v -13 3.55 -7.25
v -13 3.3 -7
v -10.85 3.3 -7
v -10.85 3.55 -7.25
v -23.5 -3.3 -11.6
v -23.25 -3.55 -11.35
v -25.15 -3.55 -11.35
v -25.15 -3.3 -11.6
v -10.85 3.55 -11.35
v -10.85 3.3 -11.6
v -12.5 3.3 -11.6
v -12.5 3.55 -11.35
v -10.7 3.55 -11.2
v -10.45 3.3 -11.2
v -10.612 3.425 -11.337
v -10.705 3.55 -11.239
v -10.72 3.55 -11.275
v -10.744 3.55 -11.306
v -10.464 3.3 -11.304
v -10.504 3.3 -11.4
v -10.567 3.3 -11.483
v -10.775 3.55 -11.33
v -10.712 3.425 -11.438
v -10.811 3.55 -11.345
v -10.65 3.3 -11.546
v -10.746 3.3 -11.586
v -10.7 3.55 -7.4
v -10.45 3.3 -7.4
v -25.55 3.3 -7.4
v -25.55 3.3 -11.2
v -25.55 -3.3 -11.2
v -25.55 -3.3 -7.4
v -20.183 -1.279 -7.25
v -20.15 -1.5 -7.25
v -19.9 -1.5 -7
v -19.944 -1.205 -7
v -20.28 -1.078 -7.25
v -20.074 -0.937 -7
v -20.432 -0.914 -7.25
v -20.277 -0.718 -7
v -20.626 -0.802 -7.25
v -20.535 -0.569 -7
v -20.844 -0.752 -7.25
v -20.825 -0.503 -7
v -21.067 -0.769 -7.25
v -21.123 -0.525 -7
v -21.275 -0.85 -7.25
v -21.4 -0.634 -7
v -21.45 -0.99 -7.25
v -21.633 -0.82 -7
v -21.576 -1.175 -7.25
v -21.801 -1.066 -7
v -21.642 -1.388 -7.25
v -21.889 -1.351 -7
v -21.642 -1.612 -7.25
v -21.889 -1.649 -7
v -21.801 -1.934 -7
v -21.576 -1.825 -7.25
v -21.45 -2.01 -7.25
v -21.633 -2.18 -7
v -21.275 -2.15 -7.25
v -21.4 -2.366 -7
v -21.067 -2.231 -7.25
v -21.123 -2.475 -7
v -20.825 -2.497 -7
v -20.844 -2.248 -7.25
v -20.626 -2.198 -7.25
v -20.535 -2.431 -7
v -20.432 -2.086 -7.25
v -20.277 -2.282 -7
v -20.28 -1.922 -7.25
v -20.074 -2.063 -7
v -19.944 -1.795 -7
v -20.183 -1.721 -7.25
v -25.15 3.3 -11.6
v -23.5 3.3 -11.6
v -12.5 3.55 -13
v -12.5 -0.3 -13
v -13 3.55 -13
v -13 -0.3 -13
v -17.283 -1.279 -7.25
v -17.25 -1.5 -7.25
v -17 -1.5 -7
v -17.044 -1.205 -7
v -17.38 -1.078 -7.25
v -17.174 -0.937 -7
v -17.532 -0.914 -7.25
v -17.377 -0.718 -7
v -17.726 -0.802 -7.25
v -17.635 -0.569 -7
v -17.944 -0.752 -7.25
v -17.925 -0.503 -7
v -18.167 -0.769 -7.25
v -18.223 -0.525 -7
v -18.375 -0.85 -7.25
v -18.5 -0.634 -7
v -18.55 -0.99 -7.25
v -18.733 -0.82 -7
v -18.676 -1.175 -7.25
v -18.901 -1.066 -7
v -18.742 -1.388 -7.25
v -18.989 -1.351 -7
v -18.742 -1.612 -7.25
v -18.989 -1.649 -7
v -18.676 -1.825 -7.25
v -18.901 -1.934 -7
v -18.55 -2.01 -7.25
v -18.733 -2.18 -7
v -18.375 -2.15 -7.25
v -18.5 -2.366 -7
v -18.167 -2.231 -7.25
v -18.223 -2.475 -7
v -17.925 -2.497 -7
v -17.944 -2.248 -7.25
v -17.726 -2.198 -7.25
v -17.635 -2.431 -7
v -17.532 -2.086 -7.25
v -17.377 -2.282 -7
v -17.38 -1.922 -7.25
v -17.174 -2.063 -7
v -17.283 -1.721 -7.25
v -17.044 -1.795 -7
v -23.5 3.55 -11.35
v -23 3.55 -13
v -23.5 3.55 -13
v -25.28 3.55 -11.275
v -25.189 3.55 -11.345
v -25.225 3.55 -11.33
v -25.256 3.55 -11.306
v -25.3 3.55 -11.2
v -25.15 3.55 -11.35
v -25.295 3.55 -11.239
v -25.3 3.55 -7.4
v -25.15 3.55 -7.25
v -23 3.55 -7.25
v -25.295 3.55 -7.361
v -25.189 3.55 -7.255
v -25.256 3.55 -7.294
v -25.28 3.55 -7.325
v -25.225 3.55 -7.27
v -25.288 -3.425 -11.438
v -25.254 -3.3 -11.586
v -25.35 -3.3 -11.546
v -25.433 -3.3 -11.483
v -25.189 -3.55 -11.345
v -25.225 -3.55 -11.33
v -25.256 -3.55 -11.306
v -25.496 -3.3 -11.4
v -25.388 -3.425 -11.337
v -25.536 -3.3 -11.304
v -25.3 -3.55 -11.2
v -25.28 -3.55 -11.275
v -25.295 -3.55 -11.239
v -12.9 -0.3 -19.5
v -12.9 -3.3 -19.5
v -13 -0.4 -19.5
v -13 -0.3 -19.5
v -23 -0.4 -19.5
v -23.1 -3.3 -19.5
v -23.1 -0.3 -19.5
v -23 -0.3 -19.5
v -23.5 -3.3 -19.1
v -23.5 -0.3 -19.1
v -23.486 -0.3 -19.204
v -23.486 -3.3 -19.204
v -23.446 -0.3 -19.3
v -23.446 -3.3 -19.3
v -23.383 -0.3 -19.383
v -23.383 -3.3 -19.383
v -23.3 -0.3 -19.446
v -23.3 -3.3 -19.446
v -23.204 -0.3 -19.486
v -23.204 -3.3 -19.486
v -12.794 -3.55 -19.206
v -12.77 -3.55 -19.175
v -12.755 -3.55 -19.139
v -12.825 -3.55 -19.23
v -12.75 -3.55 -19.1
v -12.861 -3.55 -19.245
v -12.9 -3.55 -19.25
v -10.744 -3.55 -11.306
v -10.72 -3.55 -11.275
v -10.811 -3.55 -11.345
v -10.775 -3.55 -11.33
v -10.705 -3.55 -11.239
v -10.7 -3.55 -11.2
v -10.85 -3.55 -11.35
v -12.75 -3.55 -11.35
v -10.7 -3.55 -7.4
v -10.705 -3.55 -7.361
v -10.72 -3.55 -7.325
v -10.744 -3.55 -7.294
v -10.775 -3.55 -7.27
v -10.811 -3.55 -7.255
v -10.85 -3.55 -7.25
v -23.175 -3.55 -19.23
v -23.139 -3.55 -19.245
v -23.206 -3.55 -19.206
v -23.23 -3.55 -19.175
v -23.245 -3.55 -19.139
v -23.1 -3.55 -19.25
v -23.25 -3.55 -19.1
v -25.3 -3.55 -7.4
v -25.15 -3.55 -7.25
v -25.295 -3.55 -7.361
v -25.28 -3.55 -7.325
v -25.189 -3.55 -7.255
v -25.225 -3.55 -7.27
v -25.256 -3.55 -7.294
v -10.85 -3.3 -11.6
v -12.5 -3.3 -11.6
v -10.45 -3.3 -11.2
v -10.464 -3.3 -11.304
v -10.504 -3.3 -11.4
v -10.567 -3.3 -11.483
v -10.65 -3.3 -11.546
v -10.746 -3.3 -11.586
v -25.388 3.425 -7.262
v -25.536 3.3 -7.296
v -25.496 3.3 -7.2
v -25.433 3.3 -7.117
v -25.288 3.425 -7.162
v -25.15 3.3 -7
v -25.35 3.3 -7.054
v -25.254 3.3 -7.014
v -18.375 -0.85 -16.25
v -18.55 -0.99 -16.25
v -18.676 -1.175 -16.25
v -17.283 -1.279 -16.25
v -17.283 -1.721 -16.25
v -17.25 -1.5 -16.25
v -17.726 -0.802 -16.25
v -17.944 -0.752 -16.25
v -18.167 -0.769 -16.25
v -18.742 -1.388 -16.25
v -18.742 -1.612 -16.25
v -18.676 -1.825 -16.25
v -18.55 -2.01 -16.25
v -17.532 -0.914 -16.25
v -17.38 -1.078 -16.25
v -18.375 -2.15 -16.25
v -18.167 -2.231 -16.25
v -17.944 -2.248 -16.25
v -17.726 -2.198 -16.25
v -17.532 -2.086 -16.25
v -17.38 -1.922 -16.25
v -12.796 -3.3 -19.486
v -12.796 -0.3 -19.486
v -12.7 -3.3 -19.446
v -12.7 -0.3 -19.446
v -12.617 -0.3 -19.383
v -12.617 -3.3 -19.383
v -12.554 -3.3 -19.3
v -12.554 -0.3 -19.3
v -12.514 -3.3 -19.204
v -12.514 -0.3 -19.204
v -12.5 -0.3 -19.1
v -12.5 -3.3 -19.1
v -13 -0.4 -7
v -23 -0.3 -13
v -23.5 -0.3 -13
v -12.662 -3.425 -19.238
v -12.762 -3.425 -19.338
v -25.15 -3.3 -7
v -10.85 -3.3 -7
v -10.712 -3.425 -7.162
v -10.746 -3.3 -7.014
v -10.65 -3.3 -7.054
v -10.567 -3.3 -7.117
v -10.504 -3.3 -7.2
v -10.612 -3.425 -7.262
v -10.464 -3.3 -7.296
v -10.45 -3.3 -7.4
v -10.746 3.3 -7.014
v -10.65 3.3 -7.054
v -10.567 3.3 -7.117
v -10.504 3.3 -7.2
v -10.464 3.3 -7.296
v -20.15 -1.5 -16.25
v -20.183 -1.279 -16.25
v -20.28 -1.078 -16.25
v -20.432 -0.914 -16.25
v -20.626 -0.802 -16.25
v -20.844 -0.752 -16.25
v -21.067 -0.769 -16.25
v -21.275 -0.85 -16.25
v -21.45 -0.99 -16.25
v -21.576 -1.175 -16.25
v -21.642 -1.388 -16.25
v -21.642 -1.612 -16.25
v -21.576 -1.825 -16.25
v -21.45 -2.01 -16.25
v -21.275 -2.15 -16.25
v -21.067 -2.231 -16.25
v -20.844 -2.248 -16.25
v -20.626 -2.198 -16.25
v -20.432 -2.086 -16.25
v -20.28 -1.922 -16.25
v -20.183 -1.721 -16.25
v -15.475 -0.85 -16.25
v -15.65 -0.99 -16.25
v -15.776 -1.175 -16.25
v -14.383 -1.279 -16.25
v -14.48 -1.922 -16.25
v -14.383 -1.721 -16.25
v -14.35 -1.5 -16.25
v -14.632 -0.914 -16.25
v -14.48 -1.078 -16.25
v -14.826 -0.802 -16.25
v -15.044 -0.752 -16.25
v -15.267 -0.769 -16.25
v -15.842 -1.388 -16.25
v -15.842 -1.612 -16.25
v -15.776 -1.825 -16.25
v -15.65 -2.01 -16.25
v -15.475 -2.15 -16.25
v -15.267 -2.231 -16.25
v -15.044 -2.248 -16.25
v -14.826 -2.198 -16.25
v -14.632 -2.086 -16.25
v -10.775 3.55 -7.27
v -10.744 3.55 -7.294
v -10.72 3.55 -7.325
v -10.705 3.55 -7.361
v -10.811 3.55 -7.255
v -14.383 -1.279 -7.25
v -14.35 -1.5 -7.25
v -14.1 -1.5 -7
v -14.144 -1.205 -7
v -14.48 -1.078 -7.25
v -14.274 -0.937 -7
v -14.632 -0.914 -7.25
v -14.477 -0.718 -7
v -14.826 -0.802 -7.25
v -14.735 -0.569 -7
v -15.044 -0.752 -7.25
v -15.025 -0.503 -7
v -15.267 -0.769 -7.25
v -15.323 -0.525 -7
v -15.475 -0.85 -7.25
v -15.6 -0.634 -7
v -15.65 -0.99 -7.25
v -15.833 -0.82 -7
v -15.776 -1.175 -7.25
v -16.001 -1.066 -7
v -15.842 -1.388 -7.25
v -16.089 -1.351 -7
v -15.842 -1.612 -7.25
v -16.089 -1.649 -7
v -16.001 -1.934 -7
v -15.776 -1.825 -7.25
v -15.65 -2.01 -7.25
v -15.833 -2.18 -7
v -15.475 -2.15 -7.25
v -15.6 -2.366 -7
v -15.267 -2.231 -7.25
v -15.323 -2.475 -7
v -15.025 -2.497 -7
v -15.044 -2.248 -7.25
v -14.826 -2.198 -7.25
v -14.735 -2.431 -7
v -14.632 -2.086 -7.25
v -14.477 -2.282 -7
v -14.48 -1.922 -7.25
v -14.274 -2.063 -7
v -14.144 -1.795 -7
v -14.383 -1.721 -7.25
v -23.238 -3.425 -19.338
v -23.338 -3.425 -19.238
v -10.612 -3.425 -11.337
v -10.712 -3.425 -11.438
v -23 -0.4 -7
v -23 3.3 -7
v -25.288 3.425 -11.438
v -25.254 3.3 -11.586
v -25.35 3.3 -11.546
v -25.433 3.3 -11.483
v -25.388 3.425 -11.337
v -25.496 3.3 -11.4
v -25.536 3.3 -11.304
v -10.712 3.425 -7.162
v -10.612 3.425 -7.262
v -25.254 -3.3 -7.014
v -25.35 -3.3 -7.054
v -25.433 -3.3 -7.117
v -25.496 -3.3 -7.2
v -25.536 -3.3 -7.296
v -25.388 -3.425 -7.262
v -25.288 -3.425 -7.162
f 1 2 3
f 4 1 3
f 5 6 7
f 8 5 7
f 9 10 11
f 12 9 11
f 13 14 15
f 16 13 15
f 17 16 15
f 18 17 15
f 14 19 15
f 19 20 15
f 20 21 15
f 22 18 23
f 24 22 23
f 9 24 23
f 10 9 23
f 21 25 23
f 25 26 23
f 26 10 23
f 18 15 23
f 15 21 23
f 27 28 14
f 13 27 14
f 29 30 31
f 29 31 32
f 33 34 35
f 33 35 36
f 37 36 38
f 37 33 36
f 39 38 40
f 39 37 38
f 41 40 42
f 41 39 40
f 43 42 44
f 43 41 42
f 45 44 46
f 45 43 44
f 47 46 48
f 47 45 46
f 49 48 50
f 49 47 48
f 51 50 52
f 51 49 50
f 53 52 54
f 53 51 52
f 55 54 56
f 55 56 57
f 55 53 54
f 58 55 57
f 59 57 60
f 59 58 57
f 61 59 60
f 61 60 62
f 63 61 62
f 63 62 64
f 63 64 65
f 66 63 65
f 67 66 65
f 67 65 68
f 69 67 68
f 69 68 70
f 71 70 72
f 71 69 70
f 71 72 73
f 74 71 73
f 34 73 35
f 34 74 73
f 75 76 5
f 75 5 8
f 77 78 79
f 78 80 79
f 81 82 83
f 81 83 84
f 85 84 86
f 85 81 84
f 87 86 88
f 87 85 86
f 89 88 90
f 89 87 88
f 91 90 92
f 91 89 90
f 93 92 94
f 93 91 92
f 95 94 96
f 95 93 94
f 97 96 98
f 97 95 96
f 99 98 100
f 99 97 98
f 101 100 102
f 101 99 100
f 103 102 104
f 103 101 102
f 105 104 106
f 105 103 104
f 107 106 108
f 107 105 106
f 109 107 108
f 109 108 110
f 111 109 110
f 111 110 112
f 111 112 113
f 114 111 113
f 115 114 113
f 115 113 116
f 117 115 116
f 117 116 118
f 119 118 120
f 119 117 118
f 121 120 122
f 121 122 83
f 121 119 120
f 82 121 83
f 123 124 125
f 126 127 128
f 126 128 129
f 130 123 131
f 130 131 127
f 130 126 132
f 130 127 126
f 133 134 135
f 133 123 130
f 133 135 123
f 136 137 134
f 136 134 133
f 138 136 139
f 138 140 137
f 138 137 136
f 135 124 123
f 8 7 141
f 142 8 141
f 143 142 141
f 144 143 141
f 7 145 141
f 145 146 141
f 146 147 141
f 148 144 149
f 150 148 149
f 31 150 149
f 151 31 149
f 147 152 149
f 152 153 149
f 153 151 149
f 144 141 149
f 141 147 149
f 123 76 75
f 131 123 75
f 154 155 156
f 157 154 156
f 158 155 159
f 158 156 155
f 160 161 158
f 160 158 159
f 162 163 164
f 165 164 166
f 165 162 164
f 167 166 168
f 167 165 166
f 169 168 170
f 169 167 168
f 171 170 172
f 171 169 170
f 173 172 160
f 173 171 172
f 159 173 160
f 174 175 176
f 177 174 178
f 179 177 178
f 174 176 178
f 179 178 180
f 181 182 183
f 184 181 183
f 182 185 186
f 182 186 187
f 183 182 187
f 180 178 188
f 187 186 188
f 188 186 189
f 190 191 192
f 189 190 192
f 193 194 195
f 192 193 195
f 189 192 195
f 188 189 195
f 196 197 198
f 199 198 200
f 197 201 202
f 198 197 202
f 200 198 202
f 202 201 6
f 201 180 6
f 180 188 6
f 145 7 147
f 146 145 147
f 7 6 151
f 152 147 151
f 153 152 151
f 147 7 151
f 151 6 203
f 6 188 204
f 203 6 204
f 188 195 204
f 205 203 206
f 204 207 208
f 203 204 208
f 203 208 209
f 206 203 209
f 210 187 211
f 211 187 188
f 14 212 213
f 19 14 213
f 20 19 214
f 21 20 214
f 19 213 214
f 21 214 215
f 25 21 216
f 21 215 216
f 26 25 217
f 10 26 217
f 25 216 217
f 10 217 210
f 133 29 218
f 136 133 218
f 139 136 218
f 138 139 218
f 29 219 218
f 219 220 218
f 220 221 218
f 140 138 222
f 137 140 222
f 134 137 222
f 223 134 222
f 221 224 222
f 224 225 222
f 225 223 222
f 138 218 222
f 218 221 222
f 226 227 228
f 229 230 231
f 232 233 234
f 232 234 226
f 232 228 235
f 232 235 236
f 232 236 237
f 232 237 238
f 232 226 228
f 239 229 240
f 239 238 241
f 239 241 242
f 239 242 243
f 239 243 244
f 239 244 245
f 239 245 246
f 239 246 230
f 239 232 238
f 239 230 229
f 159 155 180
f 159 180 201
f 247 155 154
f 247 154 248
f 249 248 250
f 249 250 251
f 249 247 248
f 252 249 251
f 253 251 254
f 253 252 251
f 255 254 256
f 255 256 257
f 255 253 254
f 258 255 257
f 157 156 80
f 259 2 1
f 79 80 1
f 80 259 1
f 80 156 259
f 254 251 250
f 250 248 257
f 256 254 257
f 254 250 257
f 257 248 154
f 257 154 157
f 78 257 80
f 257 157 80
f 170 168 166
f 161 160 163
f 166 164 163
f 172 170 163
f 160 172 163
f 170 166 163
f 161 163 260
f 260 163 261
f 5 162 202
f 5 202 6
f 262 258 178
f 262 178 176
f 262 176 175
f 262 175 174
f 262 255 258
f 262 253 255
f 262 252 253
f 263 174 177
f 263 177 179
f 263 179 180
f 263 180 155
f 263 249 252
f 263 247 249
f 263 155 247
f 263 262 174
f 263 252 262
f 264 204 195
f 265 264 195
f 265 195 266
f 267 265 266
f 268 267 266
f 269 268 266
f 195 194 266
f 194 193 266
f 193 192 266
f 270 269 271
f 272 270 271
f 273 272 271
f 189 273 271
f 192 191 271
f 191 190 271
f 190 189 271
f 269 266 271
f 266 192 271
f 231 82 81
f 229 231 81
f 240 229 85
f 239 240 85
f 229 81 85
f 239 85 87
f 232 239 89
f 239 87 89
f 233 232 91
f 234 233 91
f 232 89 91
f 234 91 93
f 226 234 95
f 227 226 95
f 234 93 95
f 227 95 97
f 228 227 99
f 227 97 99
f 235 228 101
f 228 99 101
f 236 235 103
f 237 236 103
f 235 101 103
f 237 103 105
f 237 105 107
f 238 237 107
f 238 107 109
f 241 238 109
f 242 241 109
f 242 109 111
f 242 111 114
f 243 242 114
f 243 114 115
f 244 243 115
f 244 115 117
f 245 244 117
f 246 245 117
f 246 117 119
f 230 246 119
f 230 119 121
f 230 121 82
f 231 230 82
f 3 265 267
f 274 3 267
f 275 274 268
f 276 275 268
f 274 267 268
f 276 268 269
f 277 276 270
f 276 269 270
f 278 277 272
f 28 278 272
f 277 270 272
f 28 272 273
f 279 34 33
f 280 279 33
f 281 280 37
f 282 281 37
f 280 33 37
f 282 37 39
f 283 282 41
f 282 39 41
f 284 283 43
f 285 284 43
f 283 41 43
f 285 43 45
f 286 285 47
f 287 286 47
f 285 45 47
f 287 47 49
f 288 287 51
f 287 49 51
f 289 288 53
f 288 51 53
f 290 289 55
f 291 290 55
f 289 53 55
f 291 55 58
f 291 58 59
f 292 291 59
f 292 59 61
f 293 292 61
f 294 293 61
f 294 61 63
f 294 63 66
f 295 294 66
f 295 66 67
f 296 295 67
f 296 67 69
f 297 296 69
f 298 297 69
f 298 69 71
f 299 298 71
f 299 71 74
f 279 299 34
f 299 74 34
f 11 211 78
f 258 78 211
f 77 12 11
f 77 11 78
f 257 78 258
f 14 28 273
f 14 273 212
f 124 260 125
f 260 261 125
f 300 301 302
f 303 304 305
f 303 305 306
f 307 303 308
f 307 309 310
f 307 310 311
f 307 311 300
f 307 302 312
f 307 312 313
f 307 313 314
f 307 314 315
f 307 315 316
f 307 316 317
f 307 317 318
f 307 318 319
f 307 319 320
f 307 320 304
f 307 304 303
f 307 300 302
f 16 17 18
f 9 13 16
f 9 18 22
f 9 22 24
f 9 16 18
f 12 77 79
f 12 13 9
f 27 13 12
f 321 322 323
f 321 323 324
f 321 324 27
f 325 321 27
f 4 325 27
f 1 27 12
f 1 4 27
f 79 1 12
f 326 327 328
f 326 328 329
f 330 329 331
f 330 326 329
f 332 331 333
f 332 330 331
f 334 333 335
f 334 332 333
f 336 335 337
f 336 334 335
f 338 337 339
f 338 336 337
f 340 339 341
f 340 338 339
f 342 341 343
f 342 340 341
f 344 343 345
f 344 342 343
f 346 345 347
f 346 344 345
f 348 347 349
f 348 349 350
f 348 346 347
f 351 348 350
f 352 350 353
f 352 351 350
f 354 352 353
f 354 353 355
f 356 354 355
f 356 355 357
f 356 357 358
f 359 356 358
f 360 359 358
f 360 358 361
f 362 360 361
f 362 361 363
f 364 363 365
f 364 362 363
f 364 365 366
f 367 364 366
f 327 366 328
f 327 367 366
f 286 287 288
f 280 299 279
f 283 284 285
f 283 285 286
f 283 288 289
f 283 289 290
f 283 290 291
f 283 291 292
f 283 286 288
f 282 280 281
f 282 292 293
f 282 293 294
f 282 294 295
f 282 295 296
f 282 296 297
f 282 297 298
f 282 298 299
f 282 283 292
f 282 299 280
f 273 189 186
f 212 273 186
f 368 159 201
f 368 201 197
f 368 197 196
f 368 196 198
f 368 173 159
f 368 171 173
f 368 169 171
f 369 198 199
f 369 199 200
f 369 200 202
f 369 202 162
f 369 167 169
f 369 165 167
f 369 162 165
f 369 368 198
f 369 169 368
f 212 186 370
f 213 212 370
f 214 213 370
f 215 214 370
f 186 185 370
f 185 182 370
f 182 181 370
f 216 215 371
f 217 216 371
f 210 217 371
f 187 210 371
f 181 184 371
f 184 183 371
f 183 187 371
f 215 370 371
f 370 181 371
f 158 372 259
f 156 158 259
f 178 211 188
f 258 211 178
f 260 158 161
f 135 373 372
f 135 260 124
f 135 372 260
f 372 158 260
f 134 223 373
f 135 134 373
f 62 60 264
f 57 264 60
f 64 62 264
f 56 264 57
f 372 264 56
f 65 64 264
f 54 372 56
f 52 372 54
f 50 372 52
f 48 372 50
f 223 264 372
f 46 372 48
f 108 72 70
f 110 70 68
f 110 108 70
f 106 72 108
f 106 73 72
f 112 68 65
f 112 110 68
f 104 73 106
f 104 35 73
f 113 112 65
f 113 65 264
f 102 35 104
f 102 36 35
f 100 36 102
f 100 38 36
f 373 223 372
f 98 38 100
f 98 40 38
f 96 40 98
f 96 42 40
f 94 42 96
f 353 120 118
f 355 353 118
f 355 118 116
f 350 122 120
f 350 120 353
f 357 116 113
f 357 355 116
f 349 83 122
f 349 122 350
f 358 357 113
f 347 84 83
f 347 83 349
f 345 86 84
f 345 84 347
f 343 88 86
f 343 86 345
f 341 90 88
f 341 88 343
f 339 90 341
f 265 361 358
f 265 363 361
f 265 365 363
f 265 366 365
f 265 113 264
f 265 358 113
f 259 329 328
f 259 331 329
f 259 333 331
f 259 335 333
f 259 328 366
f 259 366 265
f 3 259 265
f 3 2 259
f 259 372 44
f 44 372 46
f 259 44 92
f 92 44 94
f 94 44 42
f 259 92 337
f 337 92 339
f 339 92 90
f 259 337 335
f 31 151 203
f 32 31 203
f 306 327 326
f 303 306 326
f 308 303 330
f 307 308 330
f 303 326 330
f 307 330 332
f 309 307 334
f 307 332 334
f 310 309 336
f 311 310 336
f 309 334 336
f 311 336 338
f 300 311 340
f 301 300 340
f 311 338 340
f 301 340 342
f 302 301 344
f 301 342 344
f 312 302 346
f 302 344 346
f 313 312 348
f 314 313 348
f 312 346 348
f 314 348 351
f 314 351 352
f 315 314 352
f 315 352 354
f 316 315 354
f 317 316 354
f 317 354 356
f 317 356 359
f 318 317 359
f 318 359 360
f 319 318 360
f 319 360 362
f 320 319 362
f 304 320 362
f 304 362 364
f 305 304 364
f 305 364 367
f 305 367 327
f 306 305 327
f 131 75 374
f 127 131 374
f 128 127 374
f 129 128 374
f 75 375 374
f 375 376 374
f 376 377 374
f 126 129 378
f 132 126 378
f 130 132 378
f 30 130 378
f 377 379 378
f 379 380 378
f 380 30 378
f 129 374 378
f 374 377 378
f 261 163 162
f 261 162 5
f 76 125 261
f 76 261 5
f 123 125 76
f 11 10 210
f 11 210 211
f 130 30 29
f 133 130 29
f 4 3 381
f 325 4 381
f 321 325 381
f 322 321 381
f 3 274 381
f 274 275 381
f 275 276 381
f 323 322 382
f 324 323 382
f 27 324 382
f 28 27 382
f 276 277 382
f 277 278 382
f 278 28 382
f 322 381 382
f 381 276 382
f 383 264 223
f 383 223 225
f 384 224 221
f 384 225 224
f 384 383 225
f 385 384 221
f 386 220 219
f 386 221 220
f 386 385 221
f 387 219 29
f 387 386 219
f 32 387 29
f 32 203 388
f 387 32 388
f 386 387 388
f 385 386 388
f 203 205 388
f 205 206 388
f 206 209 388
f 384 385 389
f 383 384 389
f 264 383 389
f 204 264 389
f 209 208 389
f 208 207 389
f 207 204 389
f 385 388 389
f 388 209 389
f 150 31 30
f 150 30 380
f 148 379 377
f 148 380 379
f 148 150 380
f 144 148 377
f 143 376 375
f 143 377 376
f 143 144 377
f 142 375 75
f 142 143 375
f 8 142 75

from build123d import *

# Parameters (mm, degrees)
PAD024_DEPTH         = 7.1
SKETCH051_W          = 7.4
SKETCH051_H          = 6.5
POCKET035_DEPTH      = 7.551
POCKET035_DEPTH_BACK = 7.551
SKETCH052_W          = 10
SKETCH052_H          = 7.5
POCKET036_DEPTH      = 19.501
POCKET036_DEPTH_BACK = 0.001
SKETCH053_R          = 0.75
POCKET037_DEPTH      = 16.25
CHAMFER007_SIZE      = 0.25
FILLET004_R          = 0.4
CHAMFER008_SIZE      = 0.25


with BuildPart() as part:
    # Sketch050 → Pad024 (new body)
    with BuildSketch(Plane.XZ.offset(3.55)):
        Polygon((5.5, -11.6), (5.5, -19.5), (-5.5, -19.5), (-5.5, -11.6), (-7.55, -11.6), (-7.55, -7), (7.55, -7), (7.55, -11.6), align=None)
    extrude(amount=PAD024_DEPTH)

    # Sketch051 → Pocket035 (cut, two sides)
    with BuildSketch(Plane.YZ) as pocket035_sk:
        with Locations((-3.7, -16.25)):
            Rectangle(SKETCH051_W, SKETCH051_H)
    extrude(amount=-POCKET035_DEPTH, mode=Mode.SUBTRACT)
    extrude(pocket035_sk.sketch, amount=POCKET035_DEPTH_BACK, mode=Mode.SUBTRACT)

    # Sketch052 → Pocket036 (cut, two sides)
    with BuildSketch(Plane.XY) as pocket036_sk:
        with Locations((0, -3.75)):
            Rectangle(SKETCH052_W, SKETCH052_H)
    extrude(amount=-POCKET036_DEPTH, mode=Mode.SUBTRACT)
    extrude(pocket036_sk.sketch, amount=POCKET036_DEPTH_BACK, mode=Mode.SUBTRACT)

    # Sketch053 → Pocket037 (cut, symmetric)
    with BuildSketch(Plane.XY):
        with Locations((0, -8.6)):
            Circle(SKETCH053_R)
        with Locations((2.9, -8.6)):
            Circle(SKETCH053_R)
        with Locations((-2.9, -8.6)):
            Circle(SKETCH053_R)
    extrude(amount=POCKET037_DEPTH, both=True, mode=Mode.SUBTRACT)

    # Chamfer007
    chamfer007_edges = [part.edges().sort_by_distance(p)[0] for p in [
        (2.15, -8.6, -7),
        (-0.75, -8.6, -7),
        (-3.65, -8.6, -7),
    ]]
    chamfer(chamfer007_edges, length=CHAMFER007_SIZE)

    # Fillet004
    fillet004_edges = [part.edges().sort_by_distance(p)[0] for p in [
        (-7.55, -7.1, -7),
        (7.55, -7.1, -7),
        (-7.55, -7.1, -11.6),
        (5.5, -9.025, -19.5),
        (-5.5, -9.025, -19.5),
        (7.55, -7.1, -11.6),
    ]]
    fillet(fillet004_edges, radius=FILLET004_R)

    # Chamfer008
    chamfer008_edges = [part.edges().sort_by_distance(p)[0] for p in [
        (0, -10.65, -7),
        (0, -10.65, -19.5),
        (-7.55, -3.55, -9.3),
        (7.55, -3.55, -9.3),
    ]]
    chamfer(chamfer008_edges, length=CHAMFER008_SIZE)


with BuildPart() as part_1:
    # Body011 placement: moved
    add(part.part.moved(Location((-18, 7.1, 0))))


solid = part_1.part
